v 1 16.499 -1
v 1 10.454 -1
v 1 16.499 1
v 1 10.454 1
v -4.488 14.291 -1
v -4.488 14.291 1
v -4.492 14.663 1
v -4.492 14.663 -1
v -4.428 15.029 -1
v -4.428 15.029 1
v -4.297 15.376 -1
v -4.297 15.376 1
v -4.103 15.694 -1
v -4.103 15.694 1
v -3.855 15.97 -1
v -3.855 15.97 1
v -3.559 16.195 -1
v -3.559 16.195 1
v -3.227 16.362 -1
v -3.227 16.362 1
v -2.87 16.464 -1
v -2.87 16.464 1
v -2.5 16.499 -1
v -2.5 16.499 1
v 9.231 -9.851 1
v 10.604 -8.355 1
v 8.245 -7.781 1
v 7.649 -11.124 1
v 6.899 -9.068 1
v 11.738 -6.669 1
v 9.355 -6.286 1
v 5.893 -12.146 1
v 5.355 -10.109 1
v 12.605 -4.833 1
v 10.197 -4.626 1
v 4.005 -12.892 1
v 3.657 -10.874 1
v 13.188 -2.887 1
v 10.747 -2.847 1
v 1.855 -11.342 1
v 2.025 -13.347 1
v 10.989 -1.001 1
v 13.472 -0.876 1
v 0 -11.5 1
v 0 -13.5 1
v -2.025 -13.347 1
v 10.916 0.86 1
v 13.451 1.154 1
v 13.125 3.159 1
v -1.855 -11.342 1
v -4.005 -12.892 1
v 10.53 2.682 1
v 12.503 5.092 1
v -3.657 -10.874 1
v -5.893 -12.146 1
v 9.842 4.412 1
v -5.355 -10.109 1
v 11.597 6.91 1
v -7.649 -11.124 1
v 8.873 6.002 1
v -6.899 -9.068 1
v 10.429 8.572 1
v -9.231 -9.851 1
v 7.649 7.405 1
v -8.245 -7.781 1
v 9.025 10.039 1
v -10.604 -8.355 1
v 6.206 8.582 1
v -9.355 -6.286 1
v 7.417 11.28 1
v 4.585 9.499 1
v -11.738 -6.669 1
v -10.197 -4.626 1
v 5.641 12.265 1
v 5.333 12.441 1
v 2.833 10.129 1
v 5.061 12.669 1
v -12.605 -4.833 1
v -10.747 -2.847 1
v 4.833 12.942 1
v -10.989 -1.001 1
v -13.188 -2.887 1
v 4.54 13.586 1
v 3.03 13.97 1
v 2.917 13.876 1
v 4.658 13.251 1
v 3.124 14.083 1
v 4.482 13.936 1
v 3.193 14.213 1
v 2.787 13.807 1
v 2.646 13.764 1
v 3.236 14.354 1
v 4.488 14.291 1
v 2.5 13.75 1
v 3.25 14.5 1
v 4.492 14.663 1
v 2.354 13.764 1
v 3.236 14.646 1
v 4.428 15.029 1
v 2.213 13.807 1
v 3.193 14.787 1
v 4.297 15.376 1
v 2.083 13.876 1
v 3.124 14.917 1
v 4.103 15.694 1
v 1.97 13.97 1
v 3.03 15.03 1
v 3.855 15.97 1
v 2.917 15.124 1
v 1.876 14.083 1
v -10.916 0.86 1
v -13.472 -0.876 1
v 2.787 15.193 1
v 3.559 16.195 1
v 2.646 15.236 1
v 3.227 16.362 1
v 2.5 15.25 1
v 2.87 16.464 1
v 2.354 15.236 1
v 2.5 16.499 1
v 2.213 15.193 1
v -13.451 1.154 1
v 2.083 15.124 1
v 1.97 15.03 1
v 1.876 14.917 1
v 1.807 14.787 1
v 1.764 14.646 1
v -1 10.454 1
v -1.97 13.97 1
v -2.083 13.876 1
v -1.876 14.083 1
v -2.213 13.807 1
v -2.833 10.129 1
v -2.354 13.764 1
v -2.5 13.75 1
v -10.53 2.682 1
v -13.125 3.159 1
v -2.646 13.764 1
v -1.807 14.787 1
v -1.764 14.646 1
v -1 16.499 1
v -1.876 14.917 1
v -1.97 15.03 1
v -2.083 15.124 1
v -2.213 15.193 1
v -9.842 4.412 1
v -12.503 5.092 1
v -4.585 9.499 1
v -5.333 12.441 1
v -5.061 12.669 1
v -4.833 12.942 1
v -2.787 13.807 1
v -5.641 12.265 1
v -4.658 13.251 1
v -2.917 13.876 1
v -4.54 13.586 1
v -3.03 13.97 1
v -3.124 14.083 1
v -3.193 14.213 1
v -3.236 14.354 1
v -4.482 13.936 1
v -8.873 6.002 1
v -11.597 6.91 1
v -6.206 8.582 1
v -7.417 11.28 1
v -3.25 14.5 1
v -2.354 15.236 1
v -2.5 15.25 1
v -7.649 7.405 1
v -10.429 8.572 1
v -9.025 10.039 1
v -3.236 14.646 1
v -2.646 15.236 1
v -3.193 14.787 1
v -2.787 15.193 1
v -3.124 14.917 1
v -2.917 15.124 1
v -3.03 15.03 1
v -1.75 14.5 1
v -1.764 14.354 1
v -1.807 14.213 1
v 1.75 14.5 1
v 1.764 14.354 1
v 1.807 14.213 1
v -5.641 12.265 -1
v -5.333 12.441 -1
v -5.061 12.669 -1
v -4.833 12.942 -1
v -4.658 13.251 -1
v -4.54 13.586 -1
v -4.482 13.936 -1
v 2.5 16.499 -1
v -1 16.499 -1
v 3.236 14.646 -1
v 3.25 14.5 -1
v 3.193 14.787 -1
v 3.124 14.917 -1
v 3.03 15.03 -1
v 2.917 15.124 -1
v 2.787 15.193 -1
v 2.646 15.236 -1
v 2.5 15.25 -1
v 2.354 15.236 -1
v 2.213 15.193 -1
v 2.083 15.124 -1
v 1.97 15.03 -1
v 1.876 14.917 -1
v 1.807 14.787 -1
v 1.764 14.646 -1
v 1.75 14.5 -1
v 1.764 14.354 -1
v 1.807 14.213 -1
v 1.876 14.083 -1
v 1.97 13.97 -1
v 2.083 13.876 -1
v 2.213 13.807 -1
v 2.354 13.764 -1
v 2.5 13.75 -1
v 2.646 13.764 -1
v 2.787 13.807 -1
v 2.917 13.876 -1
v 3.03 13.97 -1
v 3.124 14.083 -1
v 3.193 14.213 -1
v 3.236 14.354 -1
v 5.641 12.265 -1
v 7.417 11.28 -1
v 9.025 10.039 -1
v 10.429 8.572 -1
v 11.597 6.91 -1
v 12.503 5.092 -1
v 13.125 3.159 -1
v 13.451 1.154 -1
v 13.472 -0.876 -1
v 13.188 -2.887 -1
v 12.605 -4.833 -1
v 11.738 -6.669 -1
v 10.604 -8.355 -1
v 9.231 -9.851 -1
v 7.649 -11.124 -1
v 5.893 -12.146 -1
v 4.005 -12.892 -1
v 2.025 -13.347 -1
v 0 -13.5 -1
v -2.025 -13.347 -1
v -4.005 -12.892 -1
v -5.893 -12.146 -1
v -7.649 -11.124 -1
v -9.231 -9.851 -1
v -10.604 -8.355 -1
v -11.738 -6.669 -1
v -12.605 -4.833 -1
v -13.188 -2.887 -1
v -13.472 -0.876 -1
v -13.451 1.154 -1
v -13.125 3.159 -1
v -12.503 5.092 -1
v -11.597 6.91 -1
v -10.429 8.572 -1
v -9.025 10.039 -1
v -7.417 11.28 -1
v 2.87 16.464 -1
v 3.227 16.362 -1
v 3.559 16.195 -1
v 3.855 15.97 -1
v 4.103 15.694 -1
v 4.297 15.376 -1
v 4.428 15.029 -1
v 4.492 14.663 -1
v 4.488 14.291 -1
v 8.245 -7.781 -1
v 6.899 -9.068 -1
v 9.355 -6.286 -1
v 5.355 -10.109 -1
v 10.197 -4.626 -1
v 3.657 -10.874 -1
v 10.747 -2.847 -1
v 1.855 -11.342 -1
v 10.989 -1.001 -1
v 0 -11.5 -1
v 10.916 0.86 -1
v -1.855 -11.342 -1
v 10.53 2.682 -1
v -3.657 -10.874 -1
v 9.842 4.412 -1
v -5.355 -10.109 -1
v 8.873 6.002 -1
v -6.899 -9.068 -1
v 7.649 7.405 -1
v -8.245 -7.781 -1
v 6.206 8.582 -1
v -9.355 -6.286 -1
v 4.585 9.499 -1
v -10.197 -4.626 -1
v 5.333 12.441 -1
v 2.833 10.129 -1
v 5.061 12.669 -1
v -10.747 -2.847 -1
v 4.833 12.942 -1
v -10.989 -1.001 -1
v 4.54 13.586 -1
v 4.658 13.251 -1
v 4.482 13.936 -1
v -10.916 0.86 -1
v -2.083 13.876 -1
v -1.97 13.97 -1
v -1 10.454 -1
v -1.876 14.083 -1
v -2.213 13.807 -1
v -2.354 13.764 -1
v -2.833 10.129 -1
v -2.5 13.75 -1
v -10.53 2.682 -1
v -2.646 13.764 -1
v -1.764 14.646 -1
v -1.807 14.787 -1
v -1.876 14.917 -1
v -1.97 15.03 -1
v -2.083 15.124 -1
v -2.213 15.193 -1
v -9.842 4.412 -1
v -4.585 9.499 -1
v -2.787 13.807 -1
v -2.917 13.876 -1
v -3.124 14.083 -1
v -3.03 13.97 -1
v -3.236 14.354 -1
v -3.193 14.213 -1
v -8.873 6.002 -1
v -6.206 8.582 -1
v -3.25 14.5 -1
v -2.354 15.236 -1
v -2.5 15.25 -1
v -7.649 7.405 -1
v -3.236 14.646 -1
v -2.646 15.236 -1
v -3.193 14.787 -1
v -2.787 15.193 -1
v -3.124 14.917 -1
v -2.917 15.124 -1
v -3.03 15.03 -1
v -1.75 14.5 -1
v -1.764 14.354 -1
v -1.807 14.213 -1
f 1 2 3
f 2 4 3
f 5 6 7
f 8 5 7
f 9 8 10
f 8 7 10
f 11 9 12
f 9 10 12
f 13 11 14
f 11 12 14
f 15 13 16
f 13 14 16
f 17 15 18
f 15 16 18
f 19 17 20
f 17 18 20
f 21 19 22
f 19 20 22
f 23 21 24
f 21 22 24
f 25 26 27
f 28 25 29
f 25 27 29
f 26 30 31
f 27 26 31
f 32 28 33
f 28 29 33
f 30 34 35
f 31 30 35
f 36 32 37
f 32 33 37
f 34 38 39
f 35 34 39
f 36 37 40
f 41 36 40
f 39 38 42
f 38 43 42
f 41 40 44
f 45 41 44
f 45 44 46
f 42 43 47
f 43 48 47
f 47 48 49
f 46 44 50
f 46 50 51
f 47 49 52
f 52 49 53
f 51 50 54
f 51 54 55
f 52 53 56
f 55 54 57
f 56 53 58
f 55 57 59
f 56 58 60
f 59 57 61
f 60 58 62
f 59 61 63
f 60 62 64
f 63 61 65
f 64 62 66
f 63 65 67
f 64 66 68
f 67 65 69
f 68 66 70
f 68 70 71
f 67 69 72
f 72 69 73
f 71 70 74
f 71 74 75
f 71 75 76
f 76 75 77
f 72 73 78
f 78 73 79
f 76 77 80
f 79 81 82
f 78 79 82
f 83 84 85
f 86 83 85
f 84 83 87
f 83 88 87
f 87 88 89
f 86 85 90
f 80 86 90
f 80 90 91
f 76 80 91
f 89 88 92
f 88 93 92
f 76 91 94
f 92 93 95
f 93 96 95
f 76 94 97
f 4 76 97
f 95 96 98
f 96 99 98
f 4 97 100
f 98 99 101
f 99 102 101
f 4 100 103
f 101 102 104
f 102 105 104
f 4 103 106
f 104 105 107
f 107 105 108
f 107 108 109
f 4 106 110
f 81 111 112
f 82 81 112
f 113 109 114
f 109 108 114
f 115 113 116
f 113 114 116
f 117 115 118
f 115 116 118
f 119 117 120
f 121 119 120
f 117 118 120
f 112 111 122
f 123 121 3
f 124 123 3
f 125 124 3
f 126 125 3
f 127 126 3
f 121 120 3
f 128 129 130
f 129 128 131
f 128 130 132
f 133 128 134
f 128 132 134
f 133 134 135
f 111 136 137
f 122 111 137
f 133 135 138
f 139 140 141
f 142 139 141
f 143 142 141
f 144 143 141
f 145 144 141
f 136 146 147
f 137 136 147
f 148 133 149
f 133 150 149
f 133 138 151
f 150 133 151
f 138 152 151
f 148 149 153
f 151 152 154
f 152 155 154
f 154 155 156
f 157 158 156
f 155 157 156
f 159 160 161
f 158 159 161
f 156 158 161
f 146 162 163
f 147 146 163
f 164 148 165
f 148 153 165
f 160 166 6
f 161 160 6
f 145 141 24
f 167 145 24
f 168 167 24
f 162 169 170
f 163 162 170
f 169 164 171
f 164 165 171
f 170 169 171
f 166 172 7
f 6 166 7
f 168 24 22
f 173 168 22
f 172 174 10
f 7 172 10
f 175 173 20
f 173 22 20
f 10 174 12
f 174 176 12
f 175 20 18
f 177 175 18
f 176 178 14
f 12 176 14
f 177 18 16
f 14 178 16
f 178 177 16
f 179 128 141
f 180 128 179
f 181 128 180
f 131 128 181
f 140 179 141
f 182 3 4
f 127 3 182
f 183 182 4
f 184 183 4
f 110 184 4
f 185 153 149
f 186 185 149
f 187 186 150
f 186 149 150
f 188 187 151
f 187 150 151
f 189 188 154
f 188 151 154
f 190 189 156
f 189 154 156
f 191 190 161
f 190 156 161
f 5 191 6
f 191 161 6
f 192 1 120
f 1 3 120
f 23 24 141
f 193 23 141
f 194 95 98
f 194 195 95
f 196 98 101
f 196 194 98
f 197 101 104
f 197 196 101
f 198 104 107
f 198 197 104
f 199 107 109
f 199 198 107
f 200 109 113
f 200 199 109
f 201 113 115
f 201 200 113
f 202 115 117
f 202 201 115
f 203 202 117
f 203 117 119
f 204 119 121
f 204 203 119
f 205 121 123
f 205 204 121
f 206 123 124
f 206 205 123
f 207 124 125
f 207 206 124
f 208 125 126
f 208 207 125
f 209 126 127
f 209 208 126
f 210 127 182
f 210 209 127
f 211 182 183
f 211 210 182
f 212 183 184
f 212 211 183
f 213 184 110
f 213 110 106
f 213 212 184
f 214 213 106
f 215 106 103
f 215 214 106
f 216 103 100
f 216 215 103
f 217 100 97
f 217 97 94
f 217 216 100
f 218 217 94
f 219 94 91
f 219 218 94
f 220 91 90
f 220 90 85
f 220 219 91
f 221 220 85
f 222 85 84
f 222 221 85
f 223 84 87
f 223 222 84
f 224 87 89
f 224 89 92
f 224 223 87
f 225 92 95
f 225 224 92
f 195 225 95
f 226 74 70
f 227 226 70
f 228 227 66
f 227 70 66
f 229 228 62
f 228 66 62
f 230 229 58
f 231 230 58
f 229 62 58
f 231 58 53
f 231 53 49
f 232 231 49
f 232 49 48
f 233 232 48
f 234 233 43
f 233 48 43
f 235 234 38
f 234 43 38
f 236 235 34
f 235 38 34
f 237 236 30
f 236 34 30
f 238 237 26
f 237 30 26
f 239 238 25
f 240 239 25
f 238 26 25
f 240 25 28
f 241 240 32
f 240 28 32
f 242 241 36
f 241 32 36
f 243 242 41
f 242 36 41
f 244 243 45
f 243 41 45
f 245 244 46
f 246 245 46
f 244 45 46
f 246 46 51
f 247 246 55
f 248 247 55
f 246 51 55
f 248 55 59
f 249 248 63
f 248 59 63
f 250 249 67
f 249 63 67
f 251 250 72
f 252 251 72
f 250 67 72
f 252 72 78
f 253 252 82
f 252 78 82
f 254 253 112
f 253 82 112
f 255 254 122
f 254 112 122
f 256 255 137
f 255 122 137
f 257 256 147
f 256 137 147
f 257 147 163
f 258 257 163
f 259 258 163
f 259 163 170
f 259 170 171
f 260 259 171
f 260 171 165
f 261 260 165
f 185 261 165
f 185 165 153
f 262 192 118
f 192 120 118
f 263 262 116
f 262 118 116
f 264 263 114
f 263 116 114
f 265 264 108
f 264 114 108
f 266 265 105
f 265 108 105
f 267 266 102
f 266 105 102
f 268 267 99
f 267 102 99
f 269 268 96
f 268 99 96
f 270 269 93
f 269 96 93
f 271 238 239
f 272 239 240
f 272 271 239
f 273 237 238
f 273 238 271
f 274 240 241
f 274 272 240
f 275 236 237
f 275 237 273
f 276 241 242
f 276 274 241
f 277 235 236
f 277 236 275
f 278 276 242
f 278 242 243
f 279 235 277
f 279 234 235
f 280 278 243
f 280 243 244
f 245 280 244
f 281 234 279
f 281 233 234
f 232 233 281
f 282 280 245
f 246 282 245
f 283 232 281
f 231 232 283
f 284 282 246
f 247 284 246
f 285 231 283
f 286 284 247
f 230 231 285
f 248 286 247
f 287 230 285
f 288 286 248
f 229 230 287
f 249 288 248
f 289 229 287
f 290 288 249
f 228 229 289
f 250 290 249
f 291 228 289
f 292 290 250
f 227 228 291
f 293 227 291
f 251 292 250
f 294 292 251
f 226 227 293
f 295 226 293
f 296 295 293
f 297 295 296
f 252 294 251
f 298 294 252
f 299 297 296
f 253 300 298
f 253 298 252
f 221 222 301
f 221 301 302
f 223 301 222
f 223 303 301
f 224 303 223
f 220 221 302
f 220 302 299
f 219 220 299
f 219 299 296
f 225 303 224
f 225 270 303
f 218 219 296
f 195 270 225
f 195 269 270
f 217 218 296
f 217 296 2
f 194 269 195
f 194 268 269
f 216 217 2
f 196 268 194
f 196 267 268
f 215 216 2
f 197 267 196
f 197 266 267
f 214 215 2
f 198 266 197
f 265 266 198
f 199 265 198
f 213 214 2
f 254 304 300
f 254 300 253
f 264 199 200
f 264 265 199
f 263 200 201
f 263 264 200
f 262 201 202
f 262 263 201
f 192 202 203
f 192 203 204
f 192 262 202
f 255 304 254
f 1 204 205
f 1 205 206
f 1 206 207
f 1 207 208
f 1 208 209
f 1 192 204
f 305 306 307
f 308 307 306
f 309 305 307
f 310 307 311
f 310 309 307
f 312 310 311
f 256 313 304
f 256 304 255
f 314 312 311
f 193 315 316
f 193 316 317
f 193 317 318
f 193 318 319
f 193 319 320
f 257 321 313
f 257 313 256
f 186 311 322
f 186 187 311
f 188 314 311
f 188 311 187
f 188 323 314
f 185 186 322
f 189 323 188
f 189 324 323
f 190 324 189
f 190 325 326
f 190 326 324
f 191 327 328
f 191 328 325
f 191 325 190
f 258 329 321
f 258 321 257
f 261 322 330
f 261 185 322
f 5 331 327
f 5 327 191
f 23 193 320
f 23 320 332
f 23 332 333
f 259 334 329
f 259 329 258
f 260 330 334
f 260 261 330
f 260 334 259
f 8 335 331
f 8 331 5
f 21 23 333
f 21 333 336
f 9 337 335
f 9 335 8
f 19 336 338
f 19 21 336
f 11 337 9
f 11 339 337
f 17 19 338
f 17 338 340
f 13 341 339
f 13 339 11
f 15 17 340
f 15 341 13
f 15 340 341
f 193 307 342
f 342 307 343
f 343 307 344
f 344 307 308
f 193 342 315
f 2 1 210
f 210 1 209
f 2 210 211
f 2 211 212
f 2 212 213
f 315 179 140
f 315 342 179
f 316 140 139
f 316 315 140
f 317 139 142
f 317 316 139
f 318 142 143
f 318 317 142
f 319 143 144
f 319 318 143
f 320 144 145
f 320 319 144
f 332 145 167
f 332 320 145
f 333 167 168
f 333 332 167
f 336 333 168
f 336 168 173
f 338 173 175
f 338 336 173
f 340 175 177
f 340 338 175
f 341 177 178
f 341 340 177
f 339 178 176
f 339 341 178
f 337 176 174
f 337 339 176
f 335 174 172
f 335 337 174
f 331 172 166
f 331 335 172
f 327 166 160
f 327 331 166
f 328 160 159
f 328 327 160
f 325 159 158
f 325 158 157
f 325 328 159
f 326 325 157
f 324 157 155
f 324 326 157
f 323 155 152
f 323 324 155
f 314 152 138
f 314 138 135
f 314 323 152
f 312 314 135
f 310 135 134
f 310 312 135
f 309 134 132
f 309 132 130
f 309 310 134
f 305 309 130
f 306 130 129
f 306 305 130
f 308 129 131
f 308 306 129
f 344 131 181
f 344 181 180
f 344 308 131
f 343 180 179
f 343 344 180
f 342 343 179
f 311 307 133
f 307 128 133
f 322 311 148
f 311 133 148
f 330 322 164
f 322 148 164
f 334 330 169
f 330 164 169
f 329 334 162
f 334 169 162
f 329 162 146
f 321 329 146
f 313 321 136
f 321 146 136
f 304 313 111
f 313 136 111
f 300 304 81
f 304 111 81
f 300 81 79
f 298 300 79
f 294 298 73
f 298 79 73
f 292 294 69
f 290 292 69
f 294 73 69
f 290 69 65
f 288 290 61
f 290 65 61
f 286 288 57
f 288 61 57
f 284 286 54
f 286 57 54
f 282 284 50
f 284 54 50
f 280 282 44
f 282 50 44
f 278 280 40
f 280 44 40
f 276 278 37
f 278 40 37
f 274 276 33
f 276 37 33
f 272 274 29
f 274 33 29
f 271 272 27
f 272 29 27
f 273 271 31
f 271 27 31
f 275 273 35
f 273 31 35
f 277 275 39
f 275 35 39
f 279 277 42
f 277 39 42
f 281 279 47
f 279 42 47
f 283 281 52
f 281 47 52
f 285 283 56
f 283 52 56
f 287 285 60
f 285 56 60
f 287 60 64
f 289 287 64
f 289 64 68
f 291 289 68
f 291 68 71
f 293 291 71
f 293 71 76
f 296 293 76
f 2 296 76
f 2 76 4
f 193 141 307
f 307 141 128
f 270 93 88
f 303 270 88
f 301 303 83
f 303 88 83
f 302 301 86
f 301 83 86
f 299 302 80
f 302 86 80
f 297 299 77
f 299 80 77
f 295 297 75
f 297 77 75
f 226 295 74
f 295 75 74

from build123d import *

# Parameters (mm, degrees)
IZIM1_R                     = 0.75
Y_KSEKLIK_EKSTR_ZYON1_DEPTH = 1


with BuildPart() as part:
    # Çizim1 → Yükseklik-Ekstrüzyon1 (new body, symmetric)
    with BuildSketch(Plane.XY):
        with BuildLine():
            Line((-2.5, 16.498872216), (-1, 16.498872216))
            Line((-1, 16.498872216), (-1, 10.45445115))
            ThreePointArc((-1, 10.45445115), (0, -11.5), (1, 10.45445115))
            Line((1, 10.45445115), (1, 16.498872216))
            Line((1, 16.498872216), (2.5, 16.498872216))
            ThreePointArc((2.5, 16.498872216), (3.985473902, 15.837481746), (4.487915198, 14.290994496))
            ThreePointArc((4.487915198, 14.290994496), (4.738807919, 13.092499976), (5.641216256, 12.264855448))
            ThreePointArc((5.641216256, 12.264855448), (0, -13.5), (-5.641216256, 12.264855448))
            ThreePointArc((-5.641216256, 12.264855448), (-4.738807919, 13.092499976), (-4.487915198, 14.290994496))
            ThreePointArc((-4.487915198, 14.290994496), (-3.985473902, 15.837481746), (-2.5, 16.498872216))
        make_face()
        with Locations((-2.5, 14.5)):
            Circle(IZIM1_R, mode=Mode.SUBTRACT)
        with Locations((2.5, 14.5)):
            Circle(IZIM1_R, mode=Mode.SUBTRACT)
    extrude(amount=Y_KSEKLIK_EKSTR_ZYON1_DEPTH, both=True)


solid = part.part
